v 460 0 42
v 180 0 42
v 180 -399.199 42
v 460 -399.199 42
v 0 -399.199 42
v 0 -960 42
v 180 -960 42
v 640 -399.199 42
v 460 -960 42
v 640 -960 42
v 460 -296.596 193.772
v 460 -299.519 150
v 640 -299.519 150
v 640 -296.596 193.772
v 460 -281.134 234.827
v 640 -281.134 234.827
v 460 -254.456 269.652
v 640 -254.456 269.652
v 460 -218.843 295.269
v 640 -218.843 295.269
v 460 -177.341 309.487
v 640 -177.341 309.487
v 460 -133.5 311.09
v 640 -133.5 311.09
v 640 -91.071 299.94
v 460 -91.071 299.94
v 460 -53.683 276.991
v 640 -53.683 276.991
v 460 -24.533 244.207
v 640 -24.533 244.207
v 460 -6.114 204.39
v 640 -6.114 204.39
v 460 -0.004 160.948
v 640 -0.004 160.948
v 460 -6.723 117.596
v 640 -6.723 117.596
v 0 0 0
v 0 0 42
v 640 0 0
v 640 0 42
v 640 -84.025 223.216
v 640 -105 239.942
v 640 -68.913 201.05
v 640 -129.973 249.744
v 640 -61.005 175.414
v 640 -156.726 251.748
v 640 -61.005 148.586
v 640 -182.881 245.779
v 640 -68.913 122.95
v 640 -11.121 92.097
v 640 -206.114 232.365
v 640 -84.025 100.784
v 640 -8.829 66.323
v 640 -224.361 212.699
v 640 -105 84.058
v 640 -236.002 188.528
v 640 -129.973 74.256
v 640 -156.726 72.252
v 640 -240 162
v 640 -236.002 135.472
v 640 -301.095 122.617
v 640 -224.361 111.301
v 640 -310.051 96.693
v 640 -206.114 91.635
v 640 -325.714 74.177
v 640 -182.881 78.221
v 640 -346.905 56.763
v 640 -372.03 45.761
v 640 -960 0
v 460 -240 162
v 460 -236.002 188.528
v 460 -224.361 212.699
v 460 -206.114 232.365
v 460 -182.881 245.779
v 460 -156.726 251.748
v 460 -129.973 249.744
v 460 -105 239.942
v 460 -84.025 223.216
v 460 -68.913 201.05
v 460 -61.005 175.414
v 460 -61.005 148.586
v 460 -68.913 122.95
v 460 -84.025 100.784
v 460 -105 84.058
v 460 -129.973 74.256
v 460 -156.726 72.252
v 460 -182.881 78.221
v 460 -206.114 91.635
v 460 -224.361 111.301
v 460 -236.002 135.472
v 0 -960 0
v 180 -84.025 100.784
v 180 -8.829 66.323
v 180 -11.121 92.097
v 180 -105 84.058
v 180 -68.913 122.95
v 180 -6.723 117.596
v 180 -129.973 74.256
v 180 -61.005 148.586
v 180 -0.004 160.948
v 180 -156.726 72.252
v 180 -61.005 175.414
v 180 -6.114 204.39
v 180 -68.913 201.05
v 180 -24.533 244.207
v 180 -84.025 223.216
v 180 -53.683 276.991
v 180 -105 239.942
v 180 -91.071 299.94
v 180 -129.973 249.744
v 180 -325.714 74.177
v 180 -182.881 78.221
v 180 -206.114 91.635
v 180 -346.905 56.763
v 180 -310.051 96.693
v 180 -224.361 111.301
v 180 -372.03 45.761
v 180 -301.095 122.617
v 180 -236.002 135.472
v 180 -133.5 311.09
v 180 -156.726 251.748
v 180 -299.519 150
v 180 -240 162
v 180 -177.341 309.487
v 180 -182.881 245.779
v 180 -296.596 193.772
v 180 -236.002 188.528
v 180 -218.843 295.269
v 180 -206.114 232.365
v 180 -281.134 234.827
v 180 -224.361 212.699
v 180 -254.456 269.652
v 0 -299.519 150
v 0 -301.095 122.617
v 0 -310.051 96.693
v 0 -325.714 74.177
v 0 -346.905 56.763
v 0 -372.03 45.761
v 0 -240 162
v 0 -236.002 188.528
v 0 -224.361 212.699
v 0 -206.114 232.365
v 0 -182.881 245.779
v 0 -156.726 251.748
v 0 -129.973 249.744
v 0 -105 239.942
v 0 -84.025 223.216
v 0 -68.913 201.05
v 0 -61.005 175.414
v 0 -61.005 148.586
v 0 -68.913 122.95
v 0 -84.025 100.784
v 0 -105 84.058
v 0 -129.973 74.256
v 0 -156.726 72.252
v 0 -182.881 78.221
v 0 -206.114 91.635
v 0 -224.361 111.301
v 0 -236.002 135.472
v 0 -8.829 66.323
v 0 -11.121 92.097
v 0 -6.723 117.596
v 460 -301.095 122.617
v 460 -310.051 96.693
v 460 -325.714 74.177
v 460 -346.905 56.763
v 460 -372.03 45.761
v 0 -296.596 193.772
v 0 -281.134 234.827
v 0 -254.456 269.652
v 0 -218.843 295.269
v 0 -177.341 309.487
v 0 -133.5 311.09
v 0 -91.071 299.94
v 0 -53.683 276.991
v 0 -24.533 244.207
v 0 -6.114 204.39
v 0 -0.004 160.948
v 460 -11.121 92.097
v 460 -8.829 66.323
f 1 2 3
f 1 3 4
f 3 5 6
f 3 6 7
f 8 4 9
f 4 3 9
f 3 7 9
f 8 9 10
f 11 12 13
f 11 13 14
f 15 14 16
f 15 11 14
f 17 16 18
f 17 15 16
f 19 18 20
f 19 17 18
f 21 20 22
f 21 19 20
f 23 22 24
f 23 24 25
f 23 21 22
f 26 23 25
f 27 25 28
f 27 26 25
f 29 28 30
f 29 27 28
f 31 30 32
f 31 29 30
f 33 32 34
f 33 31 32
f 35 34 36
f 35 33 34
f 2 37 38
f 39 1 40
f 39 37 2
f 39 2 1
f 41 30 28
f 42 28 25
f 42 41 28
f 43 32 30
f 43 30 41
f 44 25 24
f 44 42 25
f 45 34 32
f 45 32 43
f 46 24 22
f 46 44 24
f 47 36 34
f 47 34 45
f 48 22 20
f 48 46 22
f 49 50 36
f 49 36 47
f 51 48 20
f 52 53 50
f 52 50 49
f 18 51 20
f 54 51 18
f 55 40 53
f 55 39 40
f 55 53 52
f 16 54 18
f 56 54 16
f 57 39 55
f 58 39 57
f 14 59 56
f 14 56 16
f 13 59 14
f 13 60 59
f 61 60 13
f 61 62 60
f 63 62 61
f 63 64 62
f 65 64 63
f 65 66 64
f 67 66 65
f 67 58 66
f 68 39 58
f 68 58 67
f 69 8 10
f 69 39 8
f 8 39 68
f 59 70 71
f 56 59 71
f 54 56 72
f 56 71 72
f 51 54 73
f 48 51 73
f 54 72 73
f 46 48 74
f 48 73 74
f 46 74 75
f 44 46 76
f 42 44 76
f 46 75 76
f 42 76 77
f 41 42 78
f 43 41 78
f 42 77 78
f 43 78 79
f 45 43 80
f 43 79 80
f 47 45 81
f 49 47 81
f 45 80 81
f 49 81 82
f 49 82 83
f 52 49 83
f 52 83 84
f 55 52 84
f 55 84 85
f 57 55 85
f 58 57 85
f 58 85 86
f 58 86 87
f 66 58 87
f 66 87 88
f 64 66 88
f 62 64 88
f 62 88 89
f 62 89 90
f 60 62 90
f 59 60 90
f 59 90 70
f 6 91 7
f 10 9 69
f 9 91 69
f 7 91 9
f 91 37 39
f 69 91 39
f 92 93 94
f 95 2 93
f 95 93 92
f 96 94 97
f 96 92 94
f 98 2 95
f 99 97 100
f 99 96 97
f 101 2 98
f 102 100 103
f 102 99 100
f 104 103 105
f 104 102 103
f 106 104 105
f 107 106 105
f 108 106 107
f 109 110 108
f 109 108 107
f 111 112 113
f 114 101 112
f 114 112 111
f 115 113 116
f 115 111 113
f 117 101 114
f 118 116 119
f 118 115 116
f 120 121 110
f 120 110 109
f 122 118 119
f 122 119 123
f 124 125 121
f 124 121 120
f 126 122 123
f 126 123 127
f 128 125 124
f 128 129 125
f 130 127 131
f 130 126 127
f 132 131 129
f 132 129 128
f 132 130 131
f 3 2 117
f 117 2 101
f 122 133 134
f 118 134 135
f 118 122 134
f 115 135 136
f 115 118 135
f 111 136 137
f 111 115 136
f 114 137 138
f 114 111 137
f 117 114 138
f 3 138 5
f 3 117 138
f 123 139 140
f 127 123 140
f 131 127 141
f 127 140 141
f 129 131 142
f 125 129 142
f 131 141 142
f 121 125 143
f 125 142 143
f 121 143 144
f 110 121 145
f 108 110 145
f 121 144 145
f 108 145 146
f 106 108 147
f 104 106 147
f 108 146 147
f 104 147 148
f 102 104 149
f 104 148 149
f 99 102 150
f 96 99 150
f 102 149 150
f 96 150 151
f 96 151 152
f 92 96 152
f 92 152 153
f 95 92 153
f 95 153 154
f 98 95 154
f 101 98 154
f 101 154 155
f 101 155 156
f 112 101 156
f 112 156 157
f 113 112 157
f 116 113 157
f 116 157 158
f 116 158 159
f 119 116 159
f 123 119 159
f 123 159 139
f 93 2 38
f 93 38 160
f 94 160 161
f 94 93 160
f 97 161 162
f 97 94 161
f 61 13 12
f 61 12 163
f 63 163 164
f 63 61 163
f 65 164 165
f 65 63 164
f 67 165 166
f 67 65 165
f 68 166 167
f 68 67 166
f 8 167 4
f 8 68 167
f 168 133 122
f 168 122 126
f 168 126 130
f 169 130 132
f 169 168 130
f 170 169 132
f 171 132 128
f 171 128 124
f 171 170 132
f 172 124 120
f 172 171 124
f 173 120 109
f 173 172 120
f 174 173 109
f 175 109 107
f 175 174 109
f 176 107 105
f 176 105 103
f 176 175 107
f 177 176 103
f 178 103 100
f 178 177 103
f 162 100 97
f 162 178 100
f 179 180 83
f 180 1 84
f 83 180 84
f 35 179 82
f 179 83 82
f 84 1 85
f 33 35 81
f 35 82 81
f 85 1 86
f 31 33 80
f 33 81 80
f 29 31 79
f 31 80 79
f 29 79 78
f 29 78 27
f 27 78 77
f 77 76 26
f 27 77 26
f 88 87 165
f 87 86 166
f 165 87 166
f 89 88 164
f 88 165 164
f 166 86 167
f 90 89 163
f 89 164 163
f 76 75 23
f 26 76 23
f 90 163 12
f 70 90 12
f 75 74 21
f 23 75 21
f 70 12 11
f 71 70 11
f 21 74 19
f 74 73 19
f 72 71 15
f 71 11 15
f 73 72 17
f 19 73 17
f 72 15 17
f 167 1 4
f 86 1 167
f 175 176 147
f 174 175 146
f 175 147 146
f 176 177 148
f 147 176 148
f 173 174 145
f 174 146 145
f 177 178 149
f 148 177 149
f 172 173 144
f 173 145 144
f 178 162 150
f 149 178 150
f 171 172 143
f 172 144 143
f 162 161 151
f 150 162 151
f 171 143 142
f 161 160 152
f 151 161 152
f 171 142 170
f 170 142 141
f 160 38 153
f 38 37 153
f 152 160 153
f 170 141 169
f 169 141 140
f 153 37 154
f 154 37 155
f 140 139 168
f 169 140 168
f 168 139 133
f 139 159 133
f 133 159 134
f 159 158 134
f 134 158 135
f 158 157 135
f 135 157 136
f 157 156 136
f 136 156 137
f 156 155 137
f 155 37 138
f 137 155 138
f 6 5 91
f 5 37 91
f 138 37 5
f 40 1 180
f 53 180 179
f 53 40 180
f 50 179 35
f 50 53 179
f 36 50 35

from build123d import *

# Parameters (mm, degrees)
SKETCH1_W           = 640
SKETCH1_H           = 960
BOSS_EXTRUDE1_DEPTH = 42
SKETCH2_R           = 150
SKETCH2_R_2         = 90
BOSS_EXTRUDE2_DEPTH = 640
FILLET1_R           = 100
SKETCH3_W           = 280
SKETCH3_H           = 331.142467373
CUT_EXTRUDE1_DEPTH  = 1053


with BuildPart() as part:
    # Sketch1 → Boss-Extrude1 (new body)
    with BuildSketch(Plane.XY):
        with Locations((320, -480)):
            Rectangle(SKETCH1_W, SKETCH1_H)
    extrude(amount=BOSS_EXTRUDE1_DEPTH)

    # Sketch2 → Boss-Extrude2 (add)
    with BuildSketch(Plane.ZY):
        with Locations((162, -150)):
            Circle(SKETCH2_R)
        with Locations(Location((162, -150, 0), (0, 0, 270))):
            Circle(SKETCH2_R_2, mode=Mode.SUBTRACT)
    extrude(amount=-BOSS_EXTRUDE2_DEPTH)

    # Fillet1
    # the kernel refuses this fillet: 100 mm, written as the material it adds along each edge
    with BuildSketch(Plane(origin=(640, -240, 42), x_dir=(0, -0.48266089642206267, 0.8758073184582617), z_dir=(-1, 0, 0))) as fillet1_piece_1:
        with BuildLine():
            CenterArc((164.419726765, -91.161310821), FILLET1_R, 114.270768309, 94.588565736)
            Line((76.83899492, -139.427400463), (75.087380283, -140.392722256))
            Line((75.087380283, -140.392722256), (-1.751614637, -0.965321793))
            Line((-1.751614637, -0.965321793), (0.822098634, 1.823226216))
            ThreePointArc((0.822098634, 1.823226216), (61.657397537, -11.258033768), (122.49269644, 1.823226216))
            Line((122.49269644, 1.823226216), (123.314795074, 0))
        make_face()
    extrude(amount=640)
    with BuildSketch(Plane(origin=(640, -60, 42), x_dir=(0, 1, 0), z_dir=(-1, 0, 0))) as fillet1_piece_2:
        with BuildLine():
            CenterArc((148.795078393, -45.993847992), FILLET1_R, 152.616862204, 44.602125316)
            Line((53.277047036, -75.596308795), (51.366686409, -76.188358011))
            ThreePointArc((51.366686409, -76.188358011), (30.975334969, -34.741755066), (-1.2, -1.6))
            Line((-1.2, -1.6), (0, 2))
            ThreePointArc((0, 2), (30, 2), (58.224098432, 0.91987696))
            Line((58.224098432, 0.91987696), (60, 0))
        make_face()
    extrude(amount=640)

    # Sketch3 → Cut-Extrude1 (cut)
    with BuildSketch(Plane.XZ.offset(960)):
        with Locations((320, 207.571233687)):
            Rectangle(SKETCH3_W, SKETCH3_H)
    extrude(amount=-CUT_EXTRUDE1_DEPTH, mode=Mode.SUBTRACT)


solid = part.part
